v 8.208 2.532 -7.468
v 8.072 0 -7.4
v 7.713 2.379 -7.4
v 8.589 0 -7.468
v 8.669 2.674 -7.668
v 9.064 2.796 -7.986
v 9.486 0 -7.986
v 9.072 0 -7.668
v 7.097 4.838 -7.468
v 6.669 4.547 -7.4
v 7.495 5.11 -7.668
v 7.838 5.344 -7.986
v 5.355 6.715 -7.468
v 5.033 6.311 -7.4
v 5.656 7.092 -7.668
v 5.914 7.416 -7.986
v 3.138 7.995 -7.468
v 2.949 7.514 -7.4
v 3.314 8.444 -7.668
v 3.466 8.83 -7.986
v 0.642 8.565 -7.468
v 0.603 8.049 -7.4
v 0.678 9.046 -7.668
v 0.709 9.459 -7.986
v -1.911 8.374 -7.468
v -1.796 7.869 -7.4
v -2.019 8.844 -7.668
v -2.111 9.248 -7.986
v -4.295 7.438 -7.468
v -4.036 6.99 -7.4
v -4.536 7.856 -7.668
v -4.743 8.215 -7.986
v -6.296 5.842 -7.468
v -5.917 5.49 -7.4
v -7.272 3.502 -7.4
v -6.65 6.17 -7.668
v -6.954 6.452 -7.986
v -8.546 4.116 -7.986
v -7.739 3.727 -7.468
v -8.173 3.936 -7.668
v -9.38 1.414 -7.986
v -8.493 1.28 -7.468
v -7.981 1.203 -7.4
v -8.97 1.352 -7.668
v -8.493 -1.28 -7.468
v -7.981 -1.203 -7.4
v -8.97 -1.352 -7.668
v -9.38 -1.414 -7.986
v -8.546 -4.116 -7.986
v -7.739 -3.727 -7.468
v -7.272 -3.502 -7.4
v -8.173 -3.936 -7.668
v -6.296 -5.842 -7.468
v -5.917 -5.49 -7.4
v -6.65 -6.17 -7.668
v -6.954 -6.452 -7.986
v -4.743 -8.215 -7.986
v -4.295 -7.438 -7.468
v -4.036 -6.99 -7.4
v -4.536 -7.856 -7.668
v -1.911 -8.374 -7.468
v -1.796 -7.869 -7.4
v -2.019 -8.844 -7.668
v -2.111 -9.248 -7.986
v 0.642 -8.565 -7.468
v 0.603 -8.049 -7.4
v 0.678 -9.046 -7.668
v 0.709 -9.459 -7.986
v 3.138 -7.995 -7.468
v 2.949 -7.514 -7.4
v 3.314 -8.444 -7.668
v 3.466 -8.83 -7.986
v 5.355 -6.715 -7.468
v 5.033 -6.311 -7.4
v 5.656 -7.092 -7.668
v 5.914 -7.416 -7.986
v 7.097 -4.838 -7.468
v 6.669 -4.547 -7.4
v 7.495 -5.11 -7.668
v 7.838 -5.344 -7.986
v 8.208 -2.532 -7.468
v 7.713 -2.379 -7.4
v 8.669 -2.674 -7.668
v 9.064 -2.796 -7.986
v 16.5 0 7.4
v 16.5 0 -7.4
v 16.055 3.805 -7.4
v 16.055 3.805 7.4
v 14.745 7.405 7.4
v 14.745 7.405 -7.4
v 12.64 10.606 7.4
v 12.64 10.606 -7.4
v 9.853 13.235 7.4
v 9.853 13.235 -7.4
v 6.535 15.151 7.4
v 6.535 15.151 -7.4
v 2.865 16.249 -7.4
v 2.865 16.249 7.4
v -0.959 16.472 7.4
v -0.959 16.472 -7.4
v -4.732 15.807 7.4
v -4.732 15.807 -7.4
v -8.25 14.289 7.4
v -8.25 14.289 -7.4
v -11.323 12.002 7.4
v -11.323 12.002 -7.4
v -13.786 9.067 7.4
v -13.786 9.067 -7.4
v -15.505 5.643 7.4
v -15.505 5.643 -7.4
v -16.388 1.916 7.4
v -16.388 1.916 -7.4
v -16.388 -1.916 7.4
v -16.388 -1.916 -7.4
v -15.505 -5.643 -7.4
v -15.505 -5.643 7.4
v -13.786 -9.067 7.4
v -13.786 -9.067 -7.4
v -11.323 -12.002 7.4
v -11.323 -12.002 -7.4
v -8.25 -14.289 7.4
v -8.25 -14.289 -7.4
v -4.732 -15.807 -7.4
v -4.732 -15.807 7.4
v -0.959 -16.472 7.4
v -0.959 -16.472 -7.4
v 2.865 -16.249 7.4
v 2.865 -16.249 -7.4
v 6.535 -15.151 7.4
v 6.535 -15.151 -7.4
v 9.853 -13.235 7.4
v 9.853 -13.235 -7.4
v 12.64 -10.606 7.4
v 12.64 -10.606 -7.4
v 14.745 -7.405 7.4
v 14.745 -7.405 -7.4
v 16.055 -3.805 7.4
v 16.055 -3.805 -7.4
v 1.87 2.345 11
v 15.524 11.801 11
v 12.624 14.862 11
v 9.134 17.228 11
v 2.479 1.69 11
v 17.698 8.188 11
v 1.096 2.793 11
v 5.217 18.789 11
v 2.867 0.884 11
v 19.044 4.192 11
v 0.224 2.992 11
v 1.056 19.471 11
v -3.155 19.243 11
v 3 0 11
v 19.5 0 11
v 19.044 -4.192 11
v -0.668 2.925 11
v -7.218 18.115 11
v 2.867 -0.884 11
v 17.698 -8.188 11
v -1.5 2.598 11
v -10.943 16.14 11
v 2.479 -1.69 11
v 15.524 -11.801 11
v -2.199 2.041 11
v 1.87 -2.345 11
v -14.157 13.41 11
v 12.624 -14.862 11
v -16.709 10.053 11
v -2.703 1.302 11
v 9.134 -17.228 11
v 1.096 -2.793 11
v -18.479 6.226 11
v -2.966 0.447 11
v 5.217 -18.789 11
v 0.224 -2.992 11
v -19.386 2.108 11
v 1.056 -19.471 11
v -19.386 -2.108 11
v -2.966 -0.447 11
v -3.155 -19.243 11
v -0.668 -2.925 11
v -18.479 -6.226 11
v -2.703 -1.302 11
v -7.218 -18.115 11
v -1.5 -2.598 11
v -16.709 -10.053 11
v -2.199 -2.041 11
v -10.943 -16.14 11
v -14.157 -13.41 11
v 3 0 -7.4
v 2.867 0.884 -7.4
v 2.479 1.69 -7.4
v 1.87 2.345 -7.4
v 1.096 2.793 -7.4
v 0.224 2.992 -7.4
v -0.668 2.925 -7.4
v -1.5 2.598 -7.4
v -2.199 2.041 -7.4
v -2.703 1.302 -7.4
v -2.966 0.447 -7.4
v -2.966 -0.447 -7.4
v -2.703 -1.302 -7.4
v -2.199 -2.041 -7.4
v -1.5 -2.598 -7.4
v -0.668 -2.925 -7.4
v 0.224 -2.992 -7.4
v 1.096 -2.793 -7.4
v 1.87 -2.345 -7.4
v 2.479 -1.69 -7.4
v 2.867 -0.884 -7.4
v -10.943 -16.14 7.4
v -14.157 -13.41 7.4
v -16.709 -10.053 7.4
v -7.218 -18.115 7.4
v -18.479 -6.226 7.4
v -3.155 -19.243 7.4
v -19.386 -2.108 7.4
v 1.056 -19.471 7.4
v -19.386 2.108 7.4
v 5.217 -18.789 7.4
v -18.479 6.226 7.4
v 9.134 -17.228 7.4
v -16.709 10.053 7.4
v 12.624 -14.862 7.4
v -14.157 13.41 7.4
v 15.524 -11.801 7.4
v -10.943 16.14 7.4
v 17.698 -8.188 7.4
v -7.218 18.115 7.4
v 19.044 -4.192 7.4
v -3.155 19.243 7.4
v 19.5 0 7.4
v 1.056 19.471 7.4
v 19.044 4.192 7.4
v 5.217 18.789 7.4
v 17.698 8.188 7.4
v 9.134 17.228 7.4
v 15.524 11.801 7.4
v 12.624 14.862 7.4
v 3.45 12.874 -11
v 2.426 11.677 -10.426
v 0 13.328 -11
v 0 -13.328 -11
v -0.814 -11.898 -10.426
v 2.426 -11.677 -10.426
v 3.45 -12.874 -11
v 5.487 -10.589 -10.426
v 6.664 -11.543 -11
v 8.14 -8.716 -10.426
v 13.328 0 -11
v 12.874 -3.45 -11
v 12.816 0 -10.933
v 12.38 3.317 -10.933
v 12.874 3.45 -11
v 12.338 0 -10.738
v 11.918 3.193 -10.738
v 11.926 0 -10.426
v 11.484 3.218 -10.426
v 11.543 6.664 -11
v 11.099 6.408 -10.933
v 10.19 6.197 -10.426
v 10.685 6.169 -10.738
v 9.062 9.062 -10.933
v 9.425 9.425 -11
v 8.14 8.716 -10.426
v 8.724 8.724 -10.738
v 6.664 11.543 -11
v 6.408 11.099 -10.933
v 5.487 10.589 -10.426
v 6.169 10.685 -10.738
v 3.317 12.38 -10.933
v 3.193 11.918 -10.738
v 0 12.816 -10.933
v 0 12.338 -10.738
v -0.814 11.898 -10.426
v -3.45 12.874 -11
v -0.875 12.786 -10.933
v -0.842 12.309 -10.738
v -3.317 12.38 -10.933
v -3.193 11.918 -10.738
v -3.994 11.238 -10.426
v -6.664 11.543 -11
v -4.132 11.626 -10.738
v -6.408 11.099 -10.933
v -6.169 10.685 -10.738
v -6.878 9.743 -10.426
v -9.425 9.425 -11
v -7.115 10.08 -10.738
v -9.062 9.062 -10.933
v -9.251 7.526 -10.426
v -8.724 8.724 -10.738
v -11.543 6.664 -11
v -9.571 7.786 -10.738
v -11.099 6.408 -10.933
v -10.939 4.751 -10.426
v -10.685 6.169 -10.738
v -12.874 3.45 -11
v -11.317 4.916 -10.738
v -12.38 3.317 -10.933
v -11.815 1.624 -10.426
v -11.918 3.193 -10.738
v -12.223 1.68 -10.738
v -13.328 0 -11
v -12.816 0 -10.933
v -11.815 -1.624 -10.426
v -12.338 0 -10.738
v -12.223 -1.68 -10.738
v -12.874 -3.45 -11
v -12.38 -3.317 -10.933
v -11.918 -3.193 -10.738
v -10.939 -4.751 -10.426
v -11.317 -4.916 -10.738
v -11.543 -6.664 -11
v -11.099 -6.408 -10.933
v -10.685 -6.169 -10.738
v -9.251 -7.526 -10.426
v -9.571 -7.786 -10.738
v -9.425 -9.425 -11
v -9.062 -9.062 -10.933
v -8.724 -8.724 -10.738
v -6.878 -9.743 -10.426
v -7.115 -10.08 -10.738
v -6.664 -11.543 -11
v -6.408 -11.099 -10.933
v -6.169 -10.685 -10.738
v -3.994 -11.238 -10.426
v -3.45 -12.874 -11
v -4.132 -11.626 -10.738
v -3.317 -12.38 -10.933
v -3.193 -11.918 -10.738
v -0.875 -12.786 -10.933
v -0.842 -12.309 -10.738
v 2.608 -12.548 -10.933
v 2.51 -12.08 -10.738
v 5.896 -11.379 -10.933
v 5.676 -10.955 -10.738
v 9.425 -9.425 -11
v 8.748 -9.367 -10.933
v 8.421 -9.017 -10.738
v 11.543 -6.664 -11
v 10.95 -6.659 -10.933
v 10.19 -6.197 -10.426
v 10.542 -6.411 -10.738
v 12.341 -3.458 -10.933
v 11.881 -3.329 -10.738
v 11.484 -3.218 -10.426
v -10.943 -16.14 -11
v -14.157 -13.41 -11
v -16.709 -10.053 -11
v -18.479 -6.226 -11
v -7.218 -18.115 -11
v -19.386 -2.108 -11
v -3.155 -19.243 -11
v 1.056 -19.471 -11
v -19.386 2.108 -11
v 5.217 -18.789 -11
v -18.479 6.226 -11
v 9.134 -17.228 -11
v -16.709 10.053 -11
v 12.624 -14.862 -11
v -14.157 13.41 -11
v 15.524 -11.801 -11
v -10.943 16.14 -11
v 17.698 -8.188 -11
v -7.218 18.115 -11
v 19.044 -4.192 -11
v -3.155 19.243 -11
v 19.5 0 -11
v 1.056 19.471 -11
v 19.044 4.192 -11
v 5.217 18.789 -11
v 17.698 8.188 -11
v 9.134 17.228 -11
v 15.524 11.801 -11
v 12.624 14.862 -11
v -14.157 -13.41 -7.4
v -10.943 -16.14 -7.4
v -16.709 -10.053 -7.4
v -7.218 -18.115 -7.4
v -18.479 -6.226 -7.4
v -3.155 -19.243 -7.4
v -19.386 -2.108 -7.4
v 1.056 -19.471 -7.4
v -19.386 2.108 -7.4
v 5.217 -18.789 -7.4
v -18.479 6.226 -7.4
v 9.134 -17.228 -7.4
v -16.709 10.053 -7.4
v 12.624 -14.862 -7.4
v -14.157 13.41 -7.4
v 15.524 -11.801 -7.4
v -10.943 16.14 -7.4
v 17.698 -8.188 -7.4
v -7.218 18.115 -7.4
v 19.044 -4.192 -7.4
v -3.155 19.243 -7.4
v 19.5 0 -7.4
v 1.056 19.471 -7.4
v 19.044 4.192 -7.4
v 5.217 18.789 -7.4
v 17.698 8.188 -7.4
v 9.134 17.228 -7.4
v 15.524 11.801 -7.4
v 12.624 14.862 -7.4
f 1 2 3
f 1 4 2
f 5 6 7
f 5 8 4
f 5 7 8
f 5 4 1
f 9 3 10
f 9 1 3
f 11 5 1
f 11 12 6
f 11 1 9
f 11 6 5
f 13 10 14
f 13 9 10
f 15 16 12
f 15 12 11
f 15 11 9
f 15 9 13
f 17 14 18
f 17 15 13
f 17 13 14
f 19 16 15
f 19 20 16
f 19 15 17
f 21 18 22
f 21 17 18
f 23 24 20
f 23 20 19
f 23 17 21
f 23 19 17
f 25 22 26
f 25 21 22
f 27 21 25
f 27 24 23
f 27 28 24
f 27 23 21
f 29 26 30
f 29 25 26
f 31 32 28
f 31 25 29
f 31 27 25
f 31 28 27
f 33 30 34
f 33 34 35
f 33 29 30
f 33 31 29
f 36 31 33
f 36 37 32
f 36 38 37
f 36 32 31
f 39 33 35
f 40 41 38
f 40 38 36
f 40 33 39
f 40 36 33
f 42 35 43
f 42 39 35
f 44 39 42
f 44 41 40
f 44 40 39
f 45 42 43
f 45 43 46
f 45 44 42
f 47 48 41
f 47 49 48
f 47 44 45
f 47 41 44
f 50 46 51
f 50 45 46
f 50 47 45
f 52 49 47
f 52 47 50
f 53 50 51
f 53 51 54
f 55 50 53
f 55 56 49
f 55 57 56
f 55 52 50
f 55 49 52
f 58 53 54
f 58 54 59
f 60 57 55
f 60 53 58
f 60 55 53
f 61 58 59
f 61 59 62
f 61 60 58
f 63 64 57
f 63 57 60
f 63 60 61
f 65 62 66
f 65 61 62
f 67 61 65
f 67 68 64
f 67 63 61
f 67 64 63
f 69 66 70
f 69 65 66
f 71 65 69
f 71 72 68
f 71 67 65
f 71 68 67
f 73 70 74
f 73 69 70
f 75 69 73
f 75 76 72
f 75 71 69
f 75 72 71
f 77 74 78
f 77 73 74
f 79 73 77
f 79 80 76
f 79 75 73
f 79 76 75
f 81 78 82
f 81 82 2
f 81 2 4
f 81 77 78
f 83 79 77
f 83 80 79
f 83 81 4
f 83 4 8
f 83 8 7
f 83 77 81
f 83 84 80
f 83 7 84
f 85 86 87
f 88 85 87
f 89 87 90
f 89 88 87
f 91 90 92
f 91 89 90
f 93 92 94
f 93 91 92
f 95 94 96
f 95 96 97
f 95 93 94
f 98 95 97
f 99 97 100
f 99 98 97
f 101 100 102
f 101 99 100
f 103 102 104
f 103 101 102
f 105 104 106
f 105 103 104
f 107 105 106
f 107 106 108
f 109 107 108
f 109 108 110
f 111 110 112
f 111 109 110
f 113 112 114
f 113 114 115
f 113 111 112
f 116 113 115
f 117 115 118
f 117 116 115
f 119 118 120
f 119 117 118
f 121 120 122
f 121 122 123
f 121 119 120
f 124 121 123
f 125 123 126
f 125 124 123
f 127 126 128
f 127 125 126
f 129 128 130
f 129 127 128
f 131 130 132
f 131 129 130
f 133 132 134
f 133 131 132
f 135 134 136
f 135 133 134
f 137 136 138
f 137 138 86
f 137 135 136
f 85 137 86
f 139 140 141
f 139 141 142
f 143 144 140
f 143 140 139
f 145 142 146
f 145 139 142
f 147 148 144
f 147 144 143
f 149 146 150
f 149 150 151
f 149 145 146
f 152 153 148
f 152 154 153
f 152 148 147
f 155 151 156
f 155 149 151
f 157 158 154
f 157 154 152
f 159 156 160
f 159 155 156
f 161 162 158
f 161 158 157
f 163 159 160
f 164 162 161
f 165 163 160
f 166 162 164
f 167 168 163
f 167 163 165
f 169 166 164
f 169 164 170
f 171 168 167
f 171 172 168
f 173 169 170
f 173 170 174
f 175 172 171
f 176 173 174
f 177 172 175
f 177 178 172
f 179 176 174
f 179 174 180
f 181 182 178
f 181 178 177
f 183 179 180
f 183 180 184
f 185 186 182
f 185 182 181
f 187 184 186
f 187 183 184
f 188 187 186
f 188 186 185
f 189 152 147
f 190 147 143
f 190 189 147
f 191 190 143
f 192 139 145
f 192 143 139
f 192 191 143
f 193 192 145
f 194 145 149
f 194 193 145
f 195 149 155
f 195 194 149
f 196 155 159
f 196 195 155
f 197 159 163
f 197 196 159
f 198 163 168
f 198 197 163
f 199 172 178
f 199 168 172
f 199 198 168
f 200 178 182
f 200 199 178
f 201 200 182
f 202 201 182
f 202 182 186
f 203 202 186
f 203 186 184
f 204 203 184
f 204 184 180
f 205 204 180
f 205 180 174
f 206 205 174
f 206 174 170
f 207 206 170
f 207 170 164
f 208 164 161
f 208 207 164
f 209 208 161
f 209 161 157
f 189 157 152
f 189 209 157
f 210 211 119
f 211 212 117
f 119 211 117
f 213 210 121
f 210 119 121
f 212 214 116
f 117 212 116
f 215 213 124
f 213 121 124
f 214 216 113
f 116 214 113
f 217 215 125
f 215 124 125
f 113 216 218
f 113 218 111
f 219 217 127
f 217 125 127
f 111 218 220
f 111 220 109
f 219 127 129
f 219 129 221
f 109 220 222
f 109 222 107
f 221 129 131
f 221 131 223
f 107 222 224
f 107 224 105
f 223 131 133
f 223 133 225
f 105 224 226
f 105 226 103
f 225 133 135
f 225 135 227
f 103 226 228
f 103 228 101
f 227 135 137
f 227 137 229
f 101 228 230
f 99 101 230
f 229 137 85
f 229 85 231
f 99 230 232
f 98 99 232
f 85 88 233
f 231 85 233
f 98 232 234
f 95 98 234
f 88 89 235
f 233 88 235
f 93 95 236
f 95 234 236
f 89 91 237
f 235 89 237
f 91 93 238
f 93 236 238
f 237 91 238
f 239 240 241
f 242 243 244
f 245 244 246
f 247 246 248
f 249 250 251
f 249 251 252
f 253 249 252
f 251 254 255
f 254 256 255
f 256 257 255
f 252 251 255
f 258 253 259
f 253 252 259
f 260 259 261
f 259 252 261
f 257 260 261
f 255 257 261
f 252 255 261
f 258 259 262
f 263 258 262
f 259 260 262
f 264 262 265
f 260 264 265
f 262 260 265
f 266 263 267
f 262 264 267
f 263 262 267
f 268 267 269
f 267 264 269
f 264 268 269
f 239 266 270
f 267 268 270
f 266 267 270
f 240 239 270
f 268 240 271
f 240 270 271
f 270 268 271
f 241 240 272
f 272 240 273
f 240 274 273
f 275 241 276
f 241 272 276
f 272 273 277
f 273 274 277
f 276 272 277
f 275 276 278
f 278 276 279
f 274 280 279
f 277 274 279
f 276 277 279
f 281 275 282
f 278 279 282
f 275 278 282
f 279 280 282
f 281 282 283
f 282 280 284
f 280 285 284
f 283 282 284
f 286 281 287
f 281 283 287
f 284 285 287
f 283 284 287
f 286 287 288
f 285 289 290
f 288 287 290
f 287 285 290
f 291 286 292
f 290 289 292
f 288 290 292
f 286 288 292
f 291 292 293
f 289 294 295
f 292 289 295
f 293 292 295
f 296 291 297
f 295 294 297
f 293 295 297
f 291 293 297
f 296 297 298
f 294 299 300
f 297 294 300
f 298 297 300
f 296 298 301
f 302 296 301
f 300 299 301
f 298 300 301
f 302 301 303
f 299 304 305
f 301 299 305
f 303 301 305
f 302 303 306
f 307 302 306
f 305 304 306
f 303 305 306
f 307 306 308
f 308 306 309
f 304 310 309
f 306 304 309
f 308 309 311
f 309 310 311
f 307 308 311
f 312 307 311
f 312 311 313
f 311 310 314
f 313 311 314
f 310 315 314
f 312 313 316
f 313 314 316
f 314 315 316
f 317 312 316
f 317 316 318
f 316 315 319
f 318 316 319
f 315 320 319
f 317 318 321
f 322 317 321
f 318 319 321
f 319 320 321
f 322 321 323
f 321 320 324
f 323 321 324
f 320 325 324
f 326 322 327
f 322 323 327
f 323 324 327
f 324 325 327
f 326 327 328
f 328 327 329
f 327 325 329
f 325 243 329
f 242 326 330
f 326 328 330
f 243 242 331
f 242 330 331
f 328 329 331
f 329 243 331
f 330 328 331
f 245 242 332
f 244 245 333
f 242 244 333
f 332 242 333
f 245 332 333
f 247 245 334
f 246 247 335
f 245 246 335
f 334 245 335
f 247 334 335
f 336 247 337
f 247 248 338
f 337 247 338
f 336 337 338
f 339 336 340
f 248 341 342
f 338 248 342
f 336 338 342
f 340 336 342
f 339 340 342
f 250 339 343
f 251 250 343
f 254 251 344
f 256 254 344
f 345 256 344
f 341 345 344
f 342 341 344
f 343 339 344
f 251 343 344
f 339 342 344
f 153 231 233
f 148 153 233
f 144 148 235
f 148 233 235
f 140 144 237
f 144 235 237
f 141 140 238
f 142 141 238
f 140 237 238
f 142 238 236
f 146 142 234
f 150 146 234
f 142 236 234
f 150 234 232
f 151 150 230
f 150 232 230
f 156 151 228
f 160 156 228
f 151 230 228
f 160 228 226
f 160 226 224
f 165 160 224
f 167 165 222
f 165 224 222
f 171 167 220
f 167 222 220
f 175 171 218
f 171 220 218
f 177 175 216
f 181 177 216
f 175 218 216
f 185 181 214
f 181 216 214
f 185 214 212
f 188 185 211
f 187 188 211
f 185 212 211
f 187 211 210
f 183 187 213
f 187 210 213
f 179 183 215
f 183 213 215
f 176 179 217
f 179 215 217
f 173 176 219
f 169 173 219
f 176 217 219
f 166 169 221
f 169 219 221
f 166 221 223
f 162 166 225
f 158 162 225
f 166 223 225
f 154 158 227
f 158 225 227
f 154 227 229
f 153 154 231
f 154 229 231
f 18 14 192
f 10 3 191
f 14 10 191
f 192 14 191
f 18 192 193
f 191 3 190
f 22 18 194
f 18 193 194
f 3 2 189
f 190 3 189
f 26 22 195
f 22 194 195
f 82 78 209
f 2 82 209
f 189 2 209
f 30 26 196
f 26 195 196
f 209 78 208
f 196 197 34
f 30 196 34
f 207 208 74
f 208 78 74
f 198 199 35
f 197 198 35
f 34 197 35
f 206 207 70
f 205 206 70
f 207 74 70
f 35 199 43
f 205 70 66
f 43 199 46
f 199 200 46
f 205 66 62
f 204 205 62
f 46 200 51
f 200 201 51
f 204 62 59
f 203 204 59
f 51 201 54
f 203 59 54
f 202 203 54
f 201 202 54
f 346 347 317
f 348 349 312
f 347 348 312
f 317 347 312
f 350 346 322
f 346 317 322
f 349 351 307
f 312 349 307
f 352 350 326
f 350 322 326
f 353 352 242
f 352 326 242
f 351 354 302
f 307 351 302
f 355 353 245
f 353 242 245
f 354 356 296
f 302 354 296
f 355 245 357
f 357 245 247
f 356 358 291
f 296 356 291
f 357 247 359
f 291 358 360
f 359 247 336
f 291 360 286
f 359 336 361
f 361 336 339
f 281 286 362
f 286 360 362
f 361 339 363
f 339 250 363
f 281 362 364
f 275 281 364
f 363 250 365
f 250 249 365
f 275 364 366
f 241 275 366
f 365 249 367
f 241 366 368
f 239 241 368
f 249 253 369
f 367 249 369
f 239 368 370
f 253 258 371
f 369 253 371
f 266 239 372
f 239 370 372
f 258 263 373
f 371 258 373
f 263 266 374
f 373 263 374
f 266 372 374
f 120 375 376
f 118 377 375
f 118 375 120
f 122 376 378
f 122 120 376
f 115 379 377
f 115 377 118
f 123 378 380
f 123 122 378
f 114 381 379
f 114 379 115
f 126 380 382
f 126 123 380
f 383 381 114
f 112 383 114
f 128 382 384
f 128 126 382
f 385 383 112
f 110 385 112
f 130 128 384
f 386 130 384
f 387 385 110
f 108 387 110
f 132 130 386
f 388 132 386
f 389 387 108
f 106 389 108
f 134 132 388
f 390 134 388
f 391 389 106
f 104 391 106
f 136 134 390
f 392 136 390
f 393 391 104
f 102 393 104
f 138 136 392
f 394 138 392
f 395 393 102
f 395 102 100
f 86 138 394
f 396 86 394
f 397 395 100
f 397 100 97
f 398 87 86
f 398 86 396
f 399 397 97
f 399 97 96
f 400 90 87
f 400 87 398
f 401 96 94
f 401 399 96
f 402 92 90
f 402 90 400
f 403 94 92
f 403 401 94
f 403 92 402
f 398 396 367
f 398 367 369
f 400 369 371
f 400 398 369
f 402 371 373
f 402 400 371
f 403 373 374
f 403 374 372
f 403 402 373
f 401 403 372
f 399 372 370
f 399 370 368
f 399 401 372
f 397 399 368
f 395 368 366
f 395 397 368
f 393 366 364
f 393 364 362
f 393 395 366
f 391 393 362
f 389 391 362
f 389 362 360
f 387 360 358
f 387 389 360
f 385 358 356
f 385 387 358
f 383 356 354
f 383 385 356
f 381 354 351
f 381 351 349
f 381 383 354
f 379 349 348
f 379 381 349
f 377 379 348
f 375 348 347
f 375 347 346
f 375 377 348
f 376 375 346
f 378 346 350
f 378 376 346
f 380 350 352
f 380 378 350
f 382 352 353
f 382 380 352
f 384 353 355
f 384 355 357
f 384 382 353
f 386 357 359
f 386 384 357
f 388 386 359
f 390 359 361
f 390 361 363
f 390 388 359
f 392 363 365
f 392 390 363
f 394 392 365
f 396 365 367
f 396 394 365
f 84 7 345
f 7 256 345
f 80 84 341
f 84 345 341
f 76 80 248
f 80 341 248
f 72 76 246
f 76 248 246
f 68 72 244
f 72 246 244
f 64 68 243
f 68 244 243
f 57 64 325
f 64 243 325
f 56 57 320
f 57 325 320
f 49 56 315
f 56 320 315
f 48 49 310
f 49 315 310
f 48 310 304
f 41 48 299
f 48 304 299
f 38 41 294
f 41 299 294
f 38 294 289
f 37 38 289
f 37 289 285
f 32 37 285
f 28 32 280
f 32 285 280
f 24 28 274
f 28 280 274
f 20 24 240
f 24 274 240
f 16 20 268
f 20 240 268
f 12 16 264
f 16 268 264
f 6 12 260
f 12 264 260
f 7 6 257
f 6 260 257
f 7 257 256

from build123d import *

# Parameters (mm, degrees)
SKETCH1_R               = 16.5
SKETCH1_R_2             = 12.5
BOSS_EXTRUDE1_DEPTH     = 7.4
SKETCH6_R               = 19.5
SKETCH6_R_2             = 12.5
BOSS_EXTRUDE2_DEPTH     = 3.6
SKETCH12_R              = 12.5
SKETCH12_R_2            = 1.5
BOSS_EXTRUDE4_DEPTH     = 18.4
CHAMFER3_SIZE           = 3.6
CUT_EXTRUDE1_DEPTH      = 35.662660025
CUT_EXTRUDE1_DEPTH_BACK = 35.662660025
SKETCH14_R              = 3


with BuildPart() as part:
    # Sketch1 → Boss-Extrude1 (new, symmetric)
    with BuildSketch(Plane.XY):
        Circle(SKETCH1_R)
        Circle(SKETCH1_R_2, mode=Mode.SUBTRACT)
    extrude(amount=BOSS_EXTRUDE1_DEPTH, both=True)

    # Sketch6 → Boss-Extrude2 (add)
    with BuildSketch(Plane.XY.offset(7.4)):
        Circle(SKETCH6_R)
        Circle(SKETCH6_R_2, mode=Mode.SUBTRACT)
    boss_extrude2 = extrude(amount=BOSS_EXTRUDE2_DEPTH)

    # Mirror1: Boss-Extrude2 across plane
    add(boss_extrude2.mirror(Plane.XY))

    # Sketch12 → Boss-Extrude4 (add)
    with BuildSketch(Plane.XY.offset(11)):
        with Locations(Location((0, 0, 0), (0, 0, 180))):
            Circle(SKETCH12_R)
        Circle(SKETCH12_R_2, mode=Mode.SUBTRACT)
    extrude(amount=-BOSS_EXTRUDE4_DEPTH)

    # Chamfer3
    chamfer3_edges = [part.edges().sort_by_distance(p)[0] for p in [
        (-12.5, 0, -7.4),
    ]]
    chamfer(chamfer3_edges, length=CHAMFER3_SIZE - 0.0001)  # a hair under: the kernel refuses the full size

    # Fillet3: read off the stored shape, not the designer's step
    # Fillet3 outline → Fillet3 (revolve, cut)
    with BuildSketch(Plane.XZ):
        with BuildLine():
            Line((11.914213562, -11), (13.328427125, -11))
            ThreePointArc((13.328427125, -11), (12.56306026, -10.847759065), (11.914213562, -10.414213562))
            Line((11.914213562, -10.414213562), (11.914213562, -11))
        make_face()
    revolve(axis=Axis((0, 0, 0), (0, 0, 1)), mode=Mode.SUBTRACT)

    # Fillet3 2 outline → Fillet3 2 (revolve)
    with BuildSketch(Plane.XZ):
        with BuildLine():
            ThreePointArc((8.071572875, -7.4), (8.83693974, -7.552240935), (9.485786438, -7.985786438))
            Line((9.485786438, -7.985786438), (9.485786438, -7.4))
            Line((9.485786438, -7.4), (8.071572875, -7.4))
        make_face()
    revolve(axis=Axis((0, 0, 0), (0, 0, 1)))

    # Sketch14 → Cut-Extrude1 (cut, two sides: drawn at the far end of the back side and taken through both)
    with BuildSketch(Plane.XY.offset(-10).offset(-CUT_EXTRUDE1_DEPTH_BACK)):
        Circle(SKETCH14_R)
    extrude(amount=CUT_EXTRUDE1_DEPTH + CUT_EXTRUDE1_DEPTH_BACK, mode=Mode.SUBTRACT)


solid = part.part
